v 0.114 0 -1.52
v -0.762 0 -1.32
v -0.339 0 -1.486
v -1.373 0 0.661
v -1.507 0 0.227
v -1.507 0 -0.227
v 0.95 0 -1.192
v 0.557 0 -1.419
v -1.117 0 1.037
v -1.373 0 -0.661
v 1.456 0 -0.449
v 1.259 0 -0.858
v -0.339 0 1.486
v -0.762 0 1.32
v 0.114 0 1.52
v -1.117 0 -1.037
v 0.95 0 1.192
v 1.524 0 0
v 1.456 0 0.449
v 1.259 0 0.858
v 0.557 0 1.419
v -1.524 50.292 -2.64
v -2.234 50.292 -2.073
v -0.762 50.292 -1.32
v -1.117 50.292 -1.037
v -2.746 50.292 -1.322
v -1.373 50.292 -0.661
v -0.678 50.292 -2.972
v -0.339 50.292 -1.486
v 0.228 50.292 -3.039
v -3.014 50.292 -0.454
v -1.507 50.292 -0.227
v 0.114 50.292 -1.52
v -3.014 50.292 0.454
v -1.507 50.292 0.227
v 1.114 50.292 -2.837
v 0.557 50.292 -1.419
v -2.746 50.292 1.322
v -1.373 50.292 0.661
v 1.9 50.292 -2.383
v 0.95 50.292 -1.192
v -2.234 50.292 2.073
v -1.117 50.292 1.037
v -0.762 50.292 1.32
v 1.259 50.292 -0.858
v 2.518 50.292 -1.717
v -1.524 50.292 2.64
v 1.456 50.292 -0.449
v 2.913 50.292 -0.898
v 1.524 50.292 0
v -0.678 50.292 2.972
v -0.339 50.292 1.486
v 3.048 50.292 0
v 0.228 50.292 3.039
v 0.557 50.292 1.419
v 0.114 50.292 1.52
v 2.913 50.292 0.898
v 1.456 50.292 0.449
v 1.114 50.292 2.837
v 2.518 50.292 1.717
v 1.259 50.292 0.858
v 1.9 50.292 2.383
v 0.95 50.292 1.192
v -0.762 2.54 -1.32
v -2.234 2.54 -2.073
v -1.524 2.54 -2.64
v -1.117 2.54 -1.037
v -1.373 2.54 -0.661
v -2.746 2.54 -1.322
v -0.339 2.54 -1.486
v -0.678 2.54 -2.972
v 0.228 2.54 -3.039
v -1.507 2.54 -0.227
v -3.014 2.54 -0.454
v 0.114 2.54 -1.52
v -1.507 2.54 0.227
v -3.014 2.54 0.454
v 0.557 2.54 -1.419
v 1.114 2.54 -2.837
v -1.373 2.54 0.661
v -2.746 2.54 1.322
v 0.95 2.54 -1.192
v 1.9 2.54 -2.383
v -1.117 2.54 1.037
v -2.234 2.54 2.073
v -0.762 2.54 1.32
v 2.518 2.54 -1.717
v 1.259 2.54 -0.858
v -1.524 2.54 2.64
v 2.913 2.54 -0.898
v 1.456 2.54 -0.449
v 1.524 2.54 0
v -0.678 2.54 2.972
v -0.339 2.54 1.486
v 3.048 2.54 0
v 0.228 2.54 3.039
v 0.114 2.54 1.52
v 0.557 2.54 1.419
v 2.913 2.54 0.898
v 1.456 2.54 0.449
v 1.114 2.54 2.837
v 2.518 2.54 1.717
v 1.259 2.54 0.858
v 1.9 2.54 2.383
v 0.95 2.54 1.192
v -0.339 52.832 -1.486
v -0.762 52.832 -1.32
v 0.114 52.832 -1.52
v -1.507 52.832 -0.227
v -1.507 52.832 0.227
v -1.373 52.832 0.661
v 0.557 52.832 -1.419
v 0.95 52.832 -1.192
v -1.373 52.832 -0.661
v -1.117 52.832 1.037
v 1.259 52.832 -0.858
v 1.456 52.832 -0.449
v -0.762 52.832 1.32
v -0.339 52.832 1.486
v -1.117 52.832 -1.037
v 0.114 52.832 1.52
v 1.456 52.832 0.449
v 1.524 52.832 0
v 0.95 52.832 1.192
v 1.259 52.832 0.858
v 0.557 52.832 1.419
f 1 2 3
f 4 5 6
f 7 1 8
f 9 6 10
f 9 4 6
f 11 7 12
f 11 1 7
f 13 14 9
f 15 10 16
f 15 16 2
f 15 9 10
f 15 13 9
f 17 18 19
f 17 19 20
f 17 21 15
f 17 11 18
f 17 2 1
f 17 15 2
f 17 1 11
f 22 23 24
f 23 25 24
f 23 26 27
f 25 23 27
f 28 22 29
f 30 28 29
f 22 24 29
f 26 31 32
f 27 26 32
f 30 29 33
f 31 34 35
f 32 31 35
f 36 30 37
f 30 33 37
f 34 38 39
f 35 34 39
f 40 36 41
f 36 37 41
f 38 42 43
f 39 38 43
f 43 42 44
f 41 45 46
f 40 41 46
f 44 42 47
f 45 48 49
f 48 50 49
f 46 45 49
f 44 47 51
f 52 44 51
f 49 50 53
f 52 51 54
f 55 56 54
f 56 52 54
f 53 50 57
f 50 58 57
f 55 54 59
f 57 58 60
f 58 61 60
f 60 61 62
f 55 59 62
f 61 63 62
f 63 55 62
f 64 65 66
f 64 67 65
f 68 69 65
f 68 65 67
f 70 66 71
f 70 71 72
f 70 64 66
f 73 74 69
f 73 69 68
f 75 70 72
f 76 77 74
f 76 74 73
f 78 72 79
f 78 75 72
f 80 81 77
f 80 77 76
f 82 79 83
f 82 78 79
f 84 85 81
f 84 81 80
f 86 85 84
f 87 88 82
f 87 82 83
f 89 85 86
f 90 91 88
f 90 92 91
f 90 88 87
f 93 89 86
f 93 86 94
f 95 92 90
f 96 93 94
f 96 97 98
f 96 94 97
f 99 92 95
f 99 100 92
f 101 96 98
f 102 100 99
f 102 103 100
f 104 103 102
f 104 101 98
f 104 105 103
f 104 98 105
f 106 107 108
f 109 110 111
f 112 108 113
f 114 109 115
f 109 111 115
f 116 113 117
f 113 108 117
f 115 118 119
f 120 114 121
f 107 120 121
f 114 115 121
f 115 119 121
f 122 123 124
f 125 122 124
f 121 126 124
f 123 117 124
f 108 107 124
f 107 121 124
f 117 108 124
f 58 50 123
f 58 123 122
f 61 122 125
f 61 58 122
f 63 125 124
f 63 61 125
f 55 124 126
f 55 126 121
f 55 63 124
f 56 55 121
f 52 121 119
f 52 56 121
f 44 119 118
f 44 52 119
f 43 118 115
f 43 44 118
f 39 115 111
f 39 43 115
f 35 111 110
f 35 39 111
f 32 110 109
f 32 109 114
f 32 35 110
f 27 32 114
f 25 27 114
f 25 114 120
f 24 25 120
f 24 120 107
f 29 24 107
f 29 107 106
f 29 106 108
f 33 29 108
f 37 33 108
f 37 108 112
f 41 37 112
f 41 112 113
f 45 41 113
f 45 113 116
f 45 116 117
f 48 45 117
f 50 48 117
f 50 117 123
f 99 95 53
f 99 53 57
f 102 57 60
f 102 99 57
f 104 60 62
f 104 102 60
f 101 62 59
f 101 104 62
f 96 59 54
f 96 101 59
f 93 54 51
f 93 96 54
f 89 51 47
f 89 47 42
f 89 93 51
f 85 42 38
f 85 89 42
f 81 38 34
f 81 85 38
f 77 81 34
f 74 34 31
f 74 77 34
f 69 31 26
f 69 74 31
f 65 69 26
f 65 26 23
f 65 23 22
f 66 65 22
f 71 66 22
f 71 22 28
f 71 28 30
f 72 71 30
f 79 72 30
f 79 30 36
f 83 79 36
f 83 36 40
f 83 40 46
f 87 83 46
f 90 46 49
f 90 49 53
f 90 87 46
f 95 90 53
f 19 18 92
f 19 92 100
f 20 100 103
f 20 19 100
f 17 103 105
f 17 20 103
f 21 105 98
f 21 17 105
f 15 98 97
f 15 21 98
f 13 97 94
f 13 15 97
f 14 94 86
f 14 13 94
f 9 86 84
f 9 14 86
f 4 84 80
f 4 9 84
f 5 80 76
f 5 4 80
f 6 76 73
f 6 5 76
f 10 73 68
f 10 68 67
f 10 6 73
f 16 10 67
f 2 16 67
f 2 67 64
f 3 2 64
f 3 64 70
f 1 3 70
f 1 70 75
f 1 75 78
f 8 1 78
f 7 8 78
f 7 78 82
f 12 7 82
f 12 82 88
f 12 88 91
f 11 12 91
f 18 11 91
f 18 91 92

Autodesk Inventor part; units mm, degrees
sketch "Sketch_1" plane through (0, 0, 0) normal (0, 0, 1) x (1, 0, 0)
  line L0 (0, 0) -> (0, 52.832)
  line L1 (0, 52.832) -> (3.048, 52.832)
  line L2 (3.048, 52.832) -> (3.048, 0)
  line L3 (3.048, 0) -> (0, 0)
  line L4 (0, 0) -> (0, 52.832)
revolve "Revolution1" add sketch "Sketch_1" angle 360 about axis through (0, 0, 0) along (0, -1, 0)
sketch "Sketch_3" plane through (0, 0, 0) normal (0, 0, 1) x (1, 0, 0)
  line L0 (0, 0) -> (0, 2.54)
  line L1 (1.524, 0) -> (3.048, 0)
  line L2 (3.048, 0) -> (3.048, 2.54)
  line L3 (3.048, 2.54) -> (1.524, 2.54)
  line L4 (1.524, 2.54) -> (1.524, 0)
revolve "Revolution2" cut sketch "Sketch_3" angle 360 about axis through (0, 0, 0) along (0, -1, 0)
sketch "Sketch_4" plane through (0, 0, 0) normal (0, 0, 1) x (1, 0, 0)
  line L0 (0, 50.292) -> (0, 52.832)
  line L1 (1.524, 52.832) -> (1.524, 50.292)
  line L2 (1.524, 50.292) -> (3.048, 50.292)
  line L3 (3.048, 50.292) -> (3.048, 52.832)
  line L4 (3.048, 52.832) -> (1.524, 52.832)
revolve "Revolution3" cut sketch "Sketch_4" angle 360 about axis through (0, 50.292, 0) along (0, -1, 0)
ref_plane "additional_rod_XY" through (0, 0, 0) normal (0, 1, 0) x (1, 0, 0)
ref_plane "additional_rod_YZ" through (0, 0, 0) normal (1, 0, 0) x (0, 0, -1)
ref_plane "additional_rod_ZX" through (0, 0, 0) normal (0, 0, -1) x (0, 1, 0)
properties part number "022.08-FO1_BM_r" material "Steel"
